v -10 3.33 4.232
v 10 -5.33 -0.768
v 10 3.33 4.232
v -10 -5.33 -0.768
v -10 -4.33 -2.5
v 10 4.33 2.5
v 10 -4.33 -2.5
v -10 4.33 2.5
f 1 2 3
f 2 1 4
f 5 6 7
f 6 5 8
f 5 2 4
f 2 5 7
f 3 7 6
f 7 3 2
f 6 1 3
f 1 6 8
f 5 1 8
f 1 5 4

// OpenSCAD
// Auto-generated from tests/data/feature_fixtures_manifest.json
// fixture: plate_plain_rotated_x30
// fixture_type: plate
// description: Plain plate tilted 30° around the X axis. Guards against false axis-aligned plate detection and validates the rotated-plate detector.
// transform: rotate=[30.000000, 0.000000, 0.000000], translate=[0.000000, 0.000000, 0.000000]
$fn = 96;

plate_size = [20.000000, 10.000000, 2.000000];
plate_origin = [-10.000000, -5.000000, 0.000000];

module through_hole(center, diameter, height) {
  translate(center) cylinder(d=diameter, h=height, center=false);
}

module through_slot(start, end, width, height) {
  hull() {
    through_hole(start, width, height);
    through_hole(end, width, height);
  }
}

module counterbore_hole(center, through_d, bore_d, bore_depth, plate_thickness) {
  translate([center[0], center[1], -0.1])
    cylinder(d=through_d, h=plate_thickness + 0.2, center=false);
  translate([center[0], center[1], plate_thickness - bore_depth])
    cylinder(d=bore_d, h=bore_depth + 0.1, center=false);
}

translate([0.000000, 0.000000, 0.000000])
rotate([30.000000, 0.000000, 0.000000]) {
difference() {
  translate(plate_origin) cube(plate_size);
}
}
